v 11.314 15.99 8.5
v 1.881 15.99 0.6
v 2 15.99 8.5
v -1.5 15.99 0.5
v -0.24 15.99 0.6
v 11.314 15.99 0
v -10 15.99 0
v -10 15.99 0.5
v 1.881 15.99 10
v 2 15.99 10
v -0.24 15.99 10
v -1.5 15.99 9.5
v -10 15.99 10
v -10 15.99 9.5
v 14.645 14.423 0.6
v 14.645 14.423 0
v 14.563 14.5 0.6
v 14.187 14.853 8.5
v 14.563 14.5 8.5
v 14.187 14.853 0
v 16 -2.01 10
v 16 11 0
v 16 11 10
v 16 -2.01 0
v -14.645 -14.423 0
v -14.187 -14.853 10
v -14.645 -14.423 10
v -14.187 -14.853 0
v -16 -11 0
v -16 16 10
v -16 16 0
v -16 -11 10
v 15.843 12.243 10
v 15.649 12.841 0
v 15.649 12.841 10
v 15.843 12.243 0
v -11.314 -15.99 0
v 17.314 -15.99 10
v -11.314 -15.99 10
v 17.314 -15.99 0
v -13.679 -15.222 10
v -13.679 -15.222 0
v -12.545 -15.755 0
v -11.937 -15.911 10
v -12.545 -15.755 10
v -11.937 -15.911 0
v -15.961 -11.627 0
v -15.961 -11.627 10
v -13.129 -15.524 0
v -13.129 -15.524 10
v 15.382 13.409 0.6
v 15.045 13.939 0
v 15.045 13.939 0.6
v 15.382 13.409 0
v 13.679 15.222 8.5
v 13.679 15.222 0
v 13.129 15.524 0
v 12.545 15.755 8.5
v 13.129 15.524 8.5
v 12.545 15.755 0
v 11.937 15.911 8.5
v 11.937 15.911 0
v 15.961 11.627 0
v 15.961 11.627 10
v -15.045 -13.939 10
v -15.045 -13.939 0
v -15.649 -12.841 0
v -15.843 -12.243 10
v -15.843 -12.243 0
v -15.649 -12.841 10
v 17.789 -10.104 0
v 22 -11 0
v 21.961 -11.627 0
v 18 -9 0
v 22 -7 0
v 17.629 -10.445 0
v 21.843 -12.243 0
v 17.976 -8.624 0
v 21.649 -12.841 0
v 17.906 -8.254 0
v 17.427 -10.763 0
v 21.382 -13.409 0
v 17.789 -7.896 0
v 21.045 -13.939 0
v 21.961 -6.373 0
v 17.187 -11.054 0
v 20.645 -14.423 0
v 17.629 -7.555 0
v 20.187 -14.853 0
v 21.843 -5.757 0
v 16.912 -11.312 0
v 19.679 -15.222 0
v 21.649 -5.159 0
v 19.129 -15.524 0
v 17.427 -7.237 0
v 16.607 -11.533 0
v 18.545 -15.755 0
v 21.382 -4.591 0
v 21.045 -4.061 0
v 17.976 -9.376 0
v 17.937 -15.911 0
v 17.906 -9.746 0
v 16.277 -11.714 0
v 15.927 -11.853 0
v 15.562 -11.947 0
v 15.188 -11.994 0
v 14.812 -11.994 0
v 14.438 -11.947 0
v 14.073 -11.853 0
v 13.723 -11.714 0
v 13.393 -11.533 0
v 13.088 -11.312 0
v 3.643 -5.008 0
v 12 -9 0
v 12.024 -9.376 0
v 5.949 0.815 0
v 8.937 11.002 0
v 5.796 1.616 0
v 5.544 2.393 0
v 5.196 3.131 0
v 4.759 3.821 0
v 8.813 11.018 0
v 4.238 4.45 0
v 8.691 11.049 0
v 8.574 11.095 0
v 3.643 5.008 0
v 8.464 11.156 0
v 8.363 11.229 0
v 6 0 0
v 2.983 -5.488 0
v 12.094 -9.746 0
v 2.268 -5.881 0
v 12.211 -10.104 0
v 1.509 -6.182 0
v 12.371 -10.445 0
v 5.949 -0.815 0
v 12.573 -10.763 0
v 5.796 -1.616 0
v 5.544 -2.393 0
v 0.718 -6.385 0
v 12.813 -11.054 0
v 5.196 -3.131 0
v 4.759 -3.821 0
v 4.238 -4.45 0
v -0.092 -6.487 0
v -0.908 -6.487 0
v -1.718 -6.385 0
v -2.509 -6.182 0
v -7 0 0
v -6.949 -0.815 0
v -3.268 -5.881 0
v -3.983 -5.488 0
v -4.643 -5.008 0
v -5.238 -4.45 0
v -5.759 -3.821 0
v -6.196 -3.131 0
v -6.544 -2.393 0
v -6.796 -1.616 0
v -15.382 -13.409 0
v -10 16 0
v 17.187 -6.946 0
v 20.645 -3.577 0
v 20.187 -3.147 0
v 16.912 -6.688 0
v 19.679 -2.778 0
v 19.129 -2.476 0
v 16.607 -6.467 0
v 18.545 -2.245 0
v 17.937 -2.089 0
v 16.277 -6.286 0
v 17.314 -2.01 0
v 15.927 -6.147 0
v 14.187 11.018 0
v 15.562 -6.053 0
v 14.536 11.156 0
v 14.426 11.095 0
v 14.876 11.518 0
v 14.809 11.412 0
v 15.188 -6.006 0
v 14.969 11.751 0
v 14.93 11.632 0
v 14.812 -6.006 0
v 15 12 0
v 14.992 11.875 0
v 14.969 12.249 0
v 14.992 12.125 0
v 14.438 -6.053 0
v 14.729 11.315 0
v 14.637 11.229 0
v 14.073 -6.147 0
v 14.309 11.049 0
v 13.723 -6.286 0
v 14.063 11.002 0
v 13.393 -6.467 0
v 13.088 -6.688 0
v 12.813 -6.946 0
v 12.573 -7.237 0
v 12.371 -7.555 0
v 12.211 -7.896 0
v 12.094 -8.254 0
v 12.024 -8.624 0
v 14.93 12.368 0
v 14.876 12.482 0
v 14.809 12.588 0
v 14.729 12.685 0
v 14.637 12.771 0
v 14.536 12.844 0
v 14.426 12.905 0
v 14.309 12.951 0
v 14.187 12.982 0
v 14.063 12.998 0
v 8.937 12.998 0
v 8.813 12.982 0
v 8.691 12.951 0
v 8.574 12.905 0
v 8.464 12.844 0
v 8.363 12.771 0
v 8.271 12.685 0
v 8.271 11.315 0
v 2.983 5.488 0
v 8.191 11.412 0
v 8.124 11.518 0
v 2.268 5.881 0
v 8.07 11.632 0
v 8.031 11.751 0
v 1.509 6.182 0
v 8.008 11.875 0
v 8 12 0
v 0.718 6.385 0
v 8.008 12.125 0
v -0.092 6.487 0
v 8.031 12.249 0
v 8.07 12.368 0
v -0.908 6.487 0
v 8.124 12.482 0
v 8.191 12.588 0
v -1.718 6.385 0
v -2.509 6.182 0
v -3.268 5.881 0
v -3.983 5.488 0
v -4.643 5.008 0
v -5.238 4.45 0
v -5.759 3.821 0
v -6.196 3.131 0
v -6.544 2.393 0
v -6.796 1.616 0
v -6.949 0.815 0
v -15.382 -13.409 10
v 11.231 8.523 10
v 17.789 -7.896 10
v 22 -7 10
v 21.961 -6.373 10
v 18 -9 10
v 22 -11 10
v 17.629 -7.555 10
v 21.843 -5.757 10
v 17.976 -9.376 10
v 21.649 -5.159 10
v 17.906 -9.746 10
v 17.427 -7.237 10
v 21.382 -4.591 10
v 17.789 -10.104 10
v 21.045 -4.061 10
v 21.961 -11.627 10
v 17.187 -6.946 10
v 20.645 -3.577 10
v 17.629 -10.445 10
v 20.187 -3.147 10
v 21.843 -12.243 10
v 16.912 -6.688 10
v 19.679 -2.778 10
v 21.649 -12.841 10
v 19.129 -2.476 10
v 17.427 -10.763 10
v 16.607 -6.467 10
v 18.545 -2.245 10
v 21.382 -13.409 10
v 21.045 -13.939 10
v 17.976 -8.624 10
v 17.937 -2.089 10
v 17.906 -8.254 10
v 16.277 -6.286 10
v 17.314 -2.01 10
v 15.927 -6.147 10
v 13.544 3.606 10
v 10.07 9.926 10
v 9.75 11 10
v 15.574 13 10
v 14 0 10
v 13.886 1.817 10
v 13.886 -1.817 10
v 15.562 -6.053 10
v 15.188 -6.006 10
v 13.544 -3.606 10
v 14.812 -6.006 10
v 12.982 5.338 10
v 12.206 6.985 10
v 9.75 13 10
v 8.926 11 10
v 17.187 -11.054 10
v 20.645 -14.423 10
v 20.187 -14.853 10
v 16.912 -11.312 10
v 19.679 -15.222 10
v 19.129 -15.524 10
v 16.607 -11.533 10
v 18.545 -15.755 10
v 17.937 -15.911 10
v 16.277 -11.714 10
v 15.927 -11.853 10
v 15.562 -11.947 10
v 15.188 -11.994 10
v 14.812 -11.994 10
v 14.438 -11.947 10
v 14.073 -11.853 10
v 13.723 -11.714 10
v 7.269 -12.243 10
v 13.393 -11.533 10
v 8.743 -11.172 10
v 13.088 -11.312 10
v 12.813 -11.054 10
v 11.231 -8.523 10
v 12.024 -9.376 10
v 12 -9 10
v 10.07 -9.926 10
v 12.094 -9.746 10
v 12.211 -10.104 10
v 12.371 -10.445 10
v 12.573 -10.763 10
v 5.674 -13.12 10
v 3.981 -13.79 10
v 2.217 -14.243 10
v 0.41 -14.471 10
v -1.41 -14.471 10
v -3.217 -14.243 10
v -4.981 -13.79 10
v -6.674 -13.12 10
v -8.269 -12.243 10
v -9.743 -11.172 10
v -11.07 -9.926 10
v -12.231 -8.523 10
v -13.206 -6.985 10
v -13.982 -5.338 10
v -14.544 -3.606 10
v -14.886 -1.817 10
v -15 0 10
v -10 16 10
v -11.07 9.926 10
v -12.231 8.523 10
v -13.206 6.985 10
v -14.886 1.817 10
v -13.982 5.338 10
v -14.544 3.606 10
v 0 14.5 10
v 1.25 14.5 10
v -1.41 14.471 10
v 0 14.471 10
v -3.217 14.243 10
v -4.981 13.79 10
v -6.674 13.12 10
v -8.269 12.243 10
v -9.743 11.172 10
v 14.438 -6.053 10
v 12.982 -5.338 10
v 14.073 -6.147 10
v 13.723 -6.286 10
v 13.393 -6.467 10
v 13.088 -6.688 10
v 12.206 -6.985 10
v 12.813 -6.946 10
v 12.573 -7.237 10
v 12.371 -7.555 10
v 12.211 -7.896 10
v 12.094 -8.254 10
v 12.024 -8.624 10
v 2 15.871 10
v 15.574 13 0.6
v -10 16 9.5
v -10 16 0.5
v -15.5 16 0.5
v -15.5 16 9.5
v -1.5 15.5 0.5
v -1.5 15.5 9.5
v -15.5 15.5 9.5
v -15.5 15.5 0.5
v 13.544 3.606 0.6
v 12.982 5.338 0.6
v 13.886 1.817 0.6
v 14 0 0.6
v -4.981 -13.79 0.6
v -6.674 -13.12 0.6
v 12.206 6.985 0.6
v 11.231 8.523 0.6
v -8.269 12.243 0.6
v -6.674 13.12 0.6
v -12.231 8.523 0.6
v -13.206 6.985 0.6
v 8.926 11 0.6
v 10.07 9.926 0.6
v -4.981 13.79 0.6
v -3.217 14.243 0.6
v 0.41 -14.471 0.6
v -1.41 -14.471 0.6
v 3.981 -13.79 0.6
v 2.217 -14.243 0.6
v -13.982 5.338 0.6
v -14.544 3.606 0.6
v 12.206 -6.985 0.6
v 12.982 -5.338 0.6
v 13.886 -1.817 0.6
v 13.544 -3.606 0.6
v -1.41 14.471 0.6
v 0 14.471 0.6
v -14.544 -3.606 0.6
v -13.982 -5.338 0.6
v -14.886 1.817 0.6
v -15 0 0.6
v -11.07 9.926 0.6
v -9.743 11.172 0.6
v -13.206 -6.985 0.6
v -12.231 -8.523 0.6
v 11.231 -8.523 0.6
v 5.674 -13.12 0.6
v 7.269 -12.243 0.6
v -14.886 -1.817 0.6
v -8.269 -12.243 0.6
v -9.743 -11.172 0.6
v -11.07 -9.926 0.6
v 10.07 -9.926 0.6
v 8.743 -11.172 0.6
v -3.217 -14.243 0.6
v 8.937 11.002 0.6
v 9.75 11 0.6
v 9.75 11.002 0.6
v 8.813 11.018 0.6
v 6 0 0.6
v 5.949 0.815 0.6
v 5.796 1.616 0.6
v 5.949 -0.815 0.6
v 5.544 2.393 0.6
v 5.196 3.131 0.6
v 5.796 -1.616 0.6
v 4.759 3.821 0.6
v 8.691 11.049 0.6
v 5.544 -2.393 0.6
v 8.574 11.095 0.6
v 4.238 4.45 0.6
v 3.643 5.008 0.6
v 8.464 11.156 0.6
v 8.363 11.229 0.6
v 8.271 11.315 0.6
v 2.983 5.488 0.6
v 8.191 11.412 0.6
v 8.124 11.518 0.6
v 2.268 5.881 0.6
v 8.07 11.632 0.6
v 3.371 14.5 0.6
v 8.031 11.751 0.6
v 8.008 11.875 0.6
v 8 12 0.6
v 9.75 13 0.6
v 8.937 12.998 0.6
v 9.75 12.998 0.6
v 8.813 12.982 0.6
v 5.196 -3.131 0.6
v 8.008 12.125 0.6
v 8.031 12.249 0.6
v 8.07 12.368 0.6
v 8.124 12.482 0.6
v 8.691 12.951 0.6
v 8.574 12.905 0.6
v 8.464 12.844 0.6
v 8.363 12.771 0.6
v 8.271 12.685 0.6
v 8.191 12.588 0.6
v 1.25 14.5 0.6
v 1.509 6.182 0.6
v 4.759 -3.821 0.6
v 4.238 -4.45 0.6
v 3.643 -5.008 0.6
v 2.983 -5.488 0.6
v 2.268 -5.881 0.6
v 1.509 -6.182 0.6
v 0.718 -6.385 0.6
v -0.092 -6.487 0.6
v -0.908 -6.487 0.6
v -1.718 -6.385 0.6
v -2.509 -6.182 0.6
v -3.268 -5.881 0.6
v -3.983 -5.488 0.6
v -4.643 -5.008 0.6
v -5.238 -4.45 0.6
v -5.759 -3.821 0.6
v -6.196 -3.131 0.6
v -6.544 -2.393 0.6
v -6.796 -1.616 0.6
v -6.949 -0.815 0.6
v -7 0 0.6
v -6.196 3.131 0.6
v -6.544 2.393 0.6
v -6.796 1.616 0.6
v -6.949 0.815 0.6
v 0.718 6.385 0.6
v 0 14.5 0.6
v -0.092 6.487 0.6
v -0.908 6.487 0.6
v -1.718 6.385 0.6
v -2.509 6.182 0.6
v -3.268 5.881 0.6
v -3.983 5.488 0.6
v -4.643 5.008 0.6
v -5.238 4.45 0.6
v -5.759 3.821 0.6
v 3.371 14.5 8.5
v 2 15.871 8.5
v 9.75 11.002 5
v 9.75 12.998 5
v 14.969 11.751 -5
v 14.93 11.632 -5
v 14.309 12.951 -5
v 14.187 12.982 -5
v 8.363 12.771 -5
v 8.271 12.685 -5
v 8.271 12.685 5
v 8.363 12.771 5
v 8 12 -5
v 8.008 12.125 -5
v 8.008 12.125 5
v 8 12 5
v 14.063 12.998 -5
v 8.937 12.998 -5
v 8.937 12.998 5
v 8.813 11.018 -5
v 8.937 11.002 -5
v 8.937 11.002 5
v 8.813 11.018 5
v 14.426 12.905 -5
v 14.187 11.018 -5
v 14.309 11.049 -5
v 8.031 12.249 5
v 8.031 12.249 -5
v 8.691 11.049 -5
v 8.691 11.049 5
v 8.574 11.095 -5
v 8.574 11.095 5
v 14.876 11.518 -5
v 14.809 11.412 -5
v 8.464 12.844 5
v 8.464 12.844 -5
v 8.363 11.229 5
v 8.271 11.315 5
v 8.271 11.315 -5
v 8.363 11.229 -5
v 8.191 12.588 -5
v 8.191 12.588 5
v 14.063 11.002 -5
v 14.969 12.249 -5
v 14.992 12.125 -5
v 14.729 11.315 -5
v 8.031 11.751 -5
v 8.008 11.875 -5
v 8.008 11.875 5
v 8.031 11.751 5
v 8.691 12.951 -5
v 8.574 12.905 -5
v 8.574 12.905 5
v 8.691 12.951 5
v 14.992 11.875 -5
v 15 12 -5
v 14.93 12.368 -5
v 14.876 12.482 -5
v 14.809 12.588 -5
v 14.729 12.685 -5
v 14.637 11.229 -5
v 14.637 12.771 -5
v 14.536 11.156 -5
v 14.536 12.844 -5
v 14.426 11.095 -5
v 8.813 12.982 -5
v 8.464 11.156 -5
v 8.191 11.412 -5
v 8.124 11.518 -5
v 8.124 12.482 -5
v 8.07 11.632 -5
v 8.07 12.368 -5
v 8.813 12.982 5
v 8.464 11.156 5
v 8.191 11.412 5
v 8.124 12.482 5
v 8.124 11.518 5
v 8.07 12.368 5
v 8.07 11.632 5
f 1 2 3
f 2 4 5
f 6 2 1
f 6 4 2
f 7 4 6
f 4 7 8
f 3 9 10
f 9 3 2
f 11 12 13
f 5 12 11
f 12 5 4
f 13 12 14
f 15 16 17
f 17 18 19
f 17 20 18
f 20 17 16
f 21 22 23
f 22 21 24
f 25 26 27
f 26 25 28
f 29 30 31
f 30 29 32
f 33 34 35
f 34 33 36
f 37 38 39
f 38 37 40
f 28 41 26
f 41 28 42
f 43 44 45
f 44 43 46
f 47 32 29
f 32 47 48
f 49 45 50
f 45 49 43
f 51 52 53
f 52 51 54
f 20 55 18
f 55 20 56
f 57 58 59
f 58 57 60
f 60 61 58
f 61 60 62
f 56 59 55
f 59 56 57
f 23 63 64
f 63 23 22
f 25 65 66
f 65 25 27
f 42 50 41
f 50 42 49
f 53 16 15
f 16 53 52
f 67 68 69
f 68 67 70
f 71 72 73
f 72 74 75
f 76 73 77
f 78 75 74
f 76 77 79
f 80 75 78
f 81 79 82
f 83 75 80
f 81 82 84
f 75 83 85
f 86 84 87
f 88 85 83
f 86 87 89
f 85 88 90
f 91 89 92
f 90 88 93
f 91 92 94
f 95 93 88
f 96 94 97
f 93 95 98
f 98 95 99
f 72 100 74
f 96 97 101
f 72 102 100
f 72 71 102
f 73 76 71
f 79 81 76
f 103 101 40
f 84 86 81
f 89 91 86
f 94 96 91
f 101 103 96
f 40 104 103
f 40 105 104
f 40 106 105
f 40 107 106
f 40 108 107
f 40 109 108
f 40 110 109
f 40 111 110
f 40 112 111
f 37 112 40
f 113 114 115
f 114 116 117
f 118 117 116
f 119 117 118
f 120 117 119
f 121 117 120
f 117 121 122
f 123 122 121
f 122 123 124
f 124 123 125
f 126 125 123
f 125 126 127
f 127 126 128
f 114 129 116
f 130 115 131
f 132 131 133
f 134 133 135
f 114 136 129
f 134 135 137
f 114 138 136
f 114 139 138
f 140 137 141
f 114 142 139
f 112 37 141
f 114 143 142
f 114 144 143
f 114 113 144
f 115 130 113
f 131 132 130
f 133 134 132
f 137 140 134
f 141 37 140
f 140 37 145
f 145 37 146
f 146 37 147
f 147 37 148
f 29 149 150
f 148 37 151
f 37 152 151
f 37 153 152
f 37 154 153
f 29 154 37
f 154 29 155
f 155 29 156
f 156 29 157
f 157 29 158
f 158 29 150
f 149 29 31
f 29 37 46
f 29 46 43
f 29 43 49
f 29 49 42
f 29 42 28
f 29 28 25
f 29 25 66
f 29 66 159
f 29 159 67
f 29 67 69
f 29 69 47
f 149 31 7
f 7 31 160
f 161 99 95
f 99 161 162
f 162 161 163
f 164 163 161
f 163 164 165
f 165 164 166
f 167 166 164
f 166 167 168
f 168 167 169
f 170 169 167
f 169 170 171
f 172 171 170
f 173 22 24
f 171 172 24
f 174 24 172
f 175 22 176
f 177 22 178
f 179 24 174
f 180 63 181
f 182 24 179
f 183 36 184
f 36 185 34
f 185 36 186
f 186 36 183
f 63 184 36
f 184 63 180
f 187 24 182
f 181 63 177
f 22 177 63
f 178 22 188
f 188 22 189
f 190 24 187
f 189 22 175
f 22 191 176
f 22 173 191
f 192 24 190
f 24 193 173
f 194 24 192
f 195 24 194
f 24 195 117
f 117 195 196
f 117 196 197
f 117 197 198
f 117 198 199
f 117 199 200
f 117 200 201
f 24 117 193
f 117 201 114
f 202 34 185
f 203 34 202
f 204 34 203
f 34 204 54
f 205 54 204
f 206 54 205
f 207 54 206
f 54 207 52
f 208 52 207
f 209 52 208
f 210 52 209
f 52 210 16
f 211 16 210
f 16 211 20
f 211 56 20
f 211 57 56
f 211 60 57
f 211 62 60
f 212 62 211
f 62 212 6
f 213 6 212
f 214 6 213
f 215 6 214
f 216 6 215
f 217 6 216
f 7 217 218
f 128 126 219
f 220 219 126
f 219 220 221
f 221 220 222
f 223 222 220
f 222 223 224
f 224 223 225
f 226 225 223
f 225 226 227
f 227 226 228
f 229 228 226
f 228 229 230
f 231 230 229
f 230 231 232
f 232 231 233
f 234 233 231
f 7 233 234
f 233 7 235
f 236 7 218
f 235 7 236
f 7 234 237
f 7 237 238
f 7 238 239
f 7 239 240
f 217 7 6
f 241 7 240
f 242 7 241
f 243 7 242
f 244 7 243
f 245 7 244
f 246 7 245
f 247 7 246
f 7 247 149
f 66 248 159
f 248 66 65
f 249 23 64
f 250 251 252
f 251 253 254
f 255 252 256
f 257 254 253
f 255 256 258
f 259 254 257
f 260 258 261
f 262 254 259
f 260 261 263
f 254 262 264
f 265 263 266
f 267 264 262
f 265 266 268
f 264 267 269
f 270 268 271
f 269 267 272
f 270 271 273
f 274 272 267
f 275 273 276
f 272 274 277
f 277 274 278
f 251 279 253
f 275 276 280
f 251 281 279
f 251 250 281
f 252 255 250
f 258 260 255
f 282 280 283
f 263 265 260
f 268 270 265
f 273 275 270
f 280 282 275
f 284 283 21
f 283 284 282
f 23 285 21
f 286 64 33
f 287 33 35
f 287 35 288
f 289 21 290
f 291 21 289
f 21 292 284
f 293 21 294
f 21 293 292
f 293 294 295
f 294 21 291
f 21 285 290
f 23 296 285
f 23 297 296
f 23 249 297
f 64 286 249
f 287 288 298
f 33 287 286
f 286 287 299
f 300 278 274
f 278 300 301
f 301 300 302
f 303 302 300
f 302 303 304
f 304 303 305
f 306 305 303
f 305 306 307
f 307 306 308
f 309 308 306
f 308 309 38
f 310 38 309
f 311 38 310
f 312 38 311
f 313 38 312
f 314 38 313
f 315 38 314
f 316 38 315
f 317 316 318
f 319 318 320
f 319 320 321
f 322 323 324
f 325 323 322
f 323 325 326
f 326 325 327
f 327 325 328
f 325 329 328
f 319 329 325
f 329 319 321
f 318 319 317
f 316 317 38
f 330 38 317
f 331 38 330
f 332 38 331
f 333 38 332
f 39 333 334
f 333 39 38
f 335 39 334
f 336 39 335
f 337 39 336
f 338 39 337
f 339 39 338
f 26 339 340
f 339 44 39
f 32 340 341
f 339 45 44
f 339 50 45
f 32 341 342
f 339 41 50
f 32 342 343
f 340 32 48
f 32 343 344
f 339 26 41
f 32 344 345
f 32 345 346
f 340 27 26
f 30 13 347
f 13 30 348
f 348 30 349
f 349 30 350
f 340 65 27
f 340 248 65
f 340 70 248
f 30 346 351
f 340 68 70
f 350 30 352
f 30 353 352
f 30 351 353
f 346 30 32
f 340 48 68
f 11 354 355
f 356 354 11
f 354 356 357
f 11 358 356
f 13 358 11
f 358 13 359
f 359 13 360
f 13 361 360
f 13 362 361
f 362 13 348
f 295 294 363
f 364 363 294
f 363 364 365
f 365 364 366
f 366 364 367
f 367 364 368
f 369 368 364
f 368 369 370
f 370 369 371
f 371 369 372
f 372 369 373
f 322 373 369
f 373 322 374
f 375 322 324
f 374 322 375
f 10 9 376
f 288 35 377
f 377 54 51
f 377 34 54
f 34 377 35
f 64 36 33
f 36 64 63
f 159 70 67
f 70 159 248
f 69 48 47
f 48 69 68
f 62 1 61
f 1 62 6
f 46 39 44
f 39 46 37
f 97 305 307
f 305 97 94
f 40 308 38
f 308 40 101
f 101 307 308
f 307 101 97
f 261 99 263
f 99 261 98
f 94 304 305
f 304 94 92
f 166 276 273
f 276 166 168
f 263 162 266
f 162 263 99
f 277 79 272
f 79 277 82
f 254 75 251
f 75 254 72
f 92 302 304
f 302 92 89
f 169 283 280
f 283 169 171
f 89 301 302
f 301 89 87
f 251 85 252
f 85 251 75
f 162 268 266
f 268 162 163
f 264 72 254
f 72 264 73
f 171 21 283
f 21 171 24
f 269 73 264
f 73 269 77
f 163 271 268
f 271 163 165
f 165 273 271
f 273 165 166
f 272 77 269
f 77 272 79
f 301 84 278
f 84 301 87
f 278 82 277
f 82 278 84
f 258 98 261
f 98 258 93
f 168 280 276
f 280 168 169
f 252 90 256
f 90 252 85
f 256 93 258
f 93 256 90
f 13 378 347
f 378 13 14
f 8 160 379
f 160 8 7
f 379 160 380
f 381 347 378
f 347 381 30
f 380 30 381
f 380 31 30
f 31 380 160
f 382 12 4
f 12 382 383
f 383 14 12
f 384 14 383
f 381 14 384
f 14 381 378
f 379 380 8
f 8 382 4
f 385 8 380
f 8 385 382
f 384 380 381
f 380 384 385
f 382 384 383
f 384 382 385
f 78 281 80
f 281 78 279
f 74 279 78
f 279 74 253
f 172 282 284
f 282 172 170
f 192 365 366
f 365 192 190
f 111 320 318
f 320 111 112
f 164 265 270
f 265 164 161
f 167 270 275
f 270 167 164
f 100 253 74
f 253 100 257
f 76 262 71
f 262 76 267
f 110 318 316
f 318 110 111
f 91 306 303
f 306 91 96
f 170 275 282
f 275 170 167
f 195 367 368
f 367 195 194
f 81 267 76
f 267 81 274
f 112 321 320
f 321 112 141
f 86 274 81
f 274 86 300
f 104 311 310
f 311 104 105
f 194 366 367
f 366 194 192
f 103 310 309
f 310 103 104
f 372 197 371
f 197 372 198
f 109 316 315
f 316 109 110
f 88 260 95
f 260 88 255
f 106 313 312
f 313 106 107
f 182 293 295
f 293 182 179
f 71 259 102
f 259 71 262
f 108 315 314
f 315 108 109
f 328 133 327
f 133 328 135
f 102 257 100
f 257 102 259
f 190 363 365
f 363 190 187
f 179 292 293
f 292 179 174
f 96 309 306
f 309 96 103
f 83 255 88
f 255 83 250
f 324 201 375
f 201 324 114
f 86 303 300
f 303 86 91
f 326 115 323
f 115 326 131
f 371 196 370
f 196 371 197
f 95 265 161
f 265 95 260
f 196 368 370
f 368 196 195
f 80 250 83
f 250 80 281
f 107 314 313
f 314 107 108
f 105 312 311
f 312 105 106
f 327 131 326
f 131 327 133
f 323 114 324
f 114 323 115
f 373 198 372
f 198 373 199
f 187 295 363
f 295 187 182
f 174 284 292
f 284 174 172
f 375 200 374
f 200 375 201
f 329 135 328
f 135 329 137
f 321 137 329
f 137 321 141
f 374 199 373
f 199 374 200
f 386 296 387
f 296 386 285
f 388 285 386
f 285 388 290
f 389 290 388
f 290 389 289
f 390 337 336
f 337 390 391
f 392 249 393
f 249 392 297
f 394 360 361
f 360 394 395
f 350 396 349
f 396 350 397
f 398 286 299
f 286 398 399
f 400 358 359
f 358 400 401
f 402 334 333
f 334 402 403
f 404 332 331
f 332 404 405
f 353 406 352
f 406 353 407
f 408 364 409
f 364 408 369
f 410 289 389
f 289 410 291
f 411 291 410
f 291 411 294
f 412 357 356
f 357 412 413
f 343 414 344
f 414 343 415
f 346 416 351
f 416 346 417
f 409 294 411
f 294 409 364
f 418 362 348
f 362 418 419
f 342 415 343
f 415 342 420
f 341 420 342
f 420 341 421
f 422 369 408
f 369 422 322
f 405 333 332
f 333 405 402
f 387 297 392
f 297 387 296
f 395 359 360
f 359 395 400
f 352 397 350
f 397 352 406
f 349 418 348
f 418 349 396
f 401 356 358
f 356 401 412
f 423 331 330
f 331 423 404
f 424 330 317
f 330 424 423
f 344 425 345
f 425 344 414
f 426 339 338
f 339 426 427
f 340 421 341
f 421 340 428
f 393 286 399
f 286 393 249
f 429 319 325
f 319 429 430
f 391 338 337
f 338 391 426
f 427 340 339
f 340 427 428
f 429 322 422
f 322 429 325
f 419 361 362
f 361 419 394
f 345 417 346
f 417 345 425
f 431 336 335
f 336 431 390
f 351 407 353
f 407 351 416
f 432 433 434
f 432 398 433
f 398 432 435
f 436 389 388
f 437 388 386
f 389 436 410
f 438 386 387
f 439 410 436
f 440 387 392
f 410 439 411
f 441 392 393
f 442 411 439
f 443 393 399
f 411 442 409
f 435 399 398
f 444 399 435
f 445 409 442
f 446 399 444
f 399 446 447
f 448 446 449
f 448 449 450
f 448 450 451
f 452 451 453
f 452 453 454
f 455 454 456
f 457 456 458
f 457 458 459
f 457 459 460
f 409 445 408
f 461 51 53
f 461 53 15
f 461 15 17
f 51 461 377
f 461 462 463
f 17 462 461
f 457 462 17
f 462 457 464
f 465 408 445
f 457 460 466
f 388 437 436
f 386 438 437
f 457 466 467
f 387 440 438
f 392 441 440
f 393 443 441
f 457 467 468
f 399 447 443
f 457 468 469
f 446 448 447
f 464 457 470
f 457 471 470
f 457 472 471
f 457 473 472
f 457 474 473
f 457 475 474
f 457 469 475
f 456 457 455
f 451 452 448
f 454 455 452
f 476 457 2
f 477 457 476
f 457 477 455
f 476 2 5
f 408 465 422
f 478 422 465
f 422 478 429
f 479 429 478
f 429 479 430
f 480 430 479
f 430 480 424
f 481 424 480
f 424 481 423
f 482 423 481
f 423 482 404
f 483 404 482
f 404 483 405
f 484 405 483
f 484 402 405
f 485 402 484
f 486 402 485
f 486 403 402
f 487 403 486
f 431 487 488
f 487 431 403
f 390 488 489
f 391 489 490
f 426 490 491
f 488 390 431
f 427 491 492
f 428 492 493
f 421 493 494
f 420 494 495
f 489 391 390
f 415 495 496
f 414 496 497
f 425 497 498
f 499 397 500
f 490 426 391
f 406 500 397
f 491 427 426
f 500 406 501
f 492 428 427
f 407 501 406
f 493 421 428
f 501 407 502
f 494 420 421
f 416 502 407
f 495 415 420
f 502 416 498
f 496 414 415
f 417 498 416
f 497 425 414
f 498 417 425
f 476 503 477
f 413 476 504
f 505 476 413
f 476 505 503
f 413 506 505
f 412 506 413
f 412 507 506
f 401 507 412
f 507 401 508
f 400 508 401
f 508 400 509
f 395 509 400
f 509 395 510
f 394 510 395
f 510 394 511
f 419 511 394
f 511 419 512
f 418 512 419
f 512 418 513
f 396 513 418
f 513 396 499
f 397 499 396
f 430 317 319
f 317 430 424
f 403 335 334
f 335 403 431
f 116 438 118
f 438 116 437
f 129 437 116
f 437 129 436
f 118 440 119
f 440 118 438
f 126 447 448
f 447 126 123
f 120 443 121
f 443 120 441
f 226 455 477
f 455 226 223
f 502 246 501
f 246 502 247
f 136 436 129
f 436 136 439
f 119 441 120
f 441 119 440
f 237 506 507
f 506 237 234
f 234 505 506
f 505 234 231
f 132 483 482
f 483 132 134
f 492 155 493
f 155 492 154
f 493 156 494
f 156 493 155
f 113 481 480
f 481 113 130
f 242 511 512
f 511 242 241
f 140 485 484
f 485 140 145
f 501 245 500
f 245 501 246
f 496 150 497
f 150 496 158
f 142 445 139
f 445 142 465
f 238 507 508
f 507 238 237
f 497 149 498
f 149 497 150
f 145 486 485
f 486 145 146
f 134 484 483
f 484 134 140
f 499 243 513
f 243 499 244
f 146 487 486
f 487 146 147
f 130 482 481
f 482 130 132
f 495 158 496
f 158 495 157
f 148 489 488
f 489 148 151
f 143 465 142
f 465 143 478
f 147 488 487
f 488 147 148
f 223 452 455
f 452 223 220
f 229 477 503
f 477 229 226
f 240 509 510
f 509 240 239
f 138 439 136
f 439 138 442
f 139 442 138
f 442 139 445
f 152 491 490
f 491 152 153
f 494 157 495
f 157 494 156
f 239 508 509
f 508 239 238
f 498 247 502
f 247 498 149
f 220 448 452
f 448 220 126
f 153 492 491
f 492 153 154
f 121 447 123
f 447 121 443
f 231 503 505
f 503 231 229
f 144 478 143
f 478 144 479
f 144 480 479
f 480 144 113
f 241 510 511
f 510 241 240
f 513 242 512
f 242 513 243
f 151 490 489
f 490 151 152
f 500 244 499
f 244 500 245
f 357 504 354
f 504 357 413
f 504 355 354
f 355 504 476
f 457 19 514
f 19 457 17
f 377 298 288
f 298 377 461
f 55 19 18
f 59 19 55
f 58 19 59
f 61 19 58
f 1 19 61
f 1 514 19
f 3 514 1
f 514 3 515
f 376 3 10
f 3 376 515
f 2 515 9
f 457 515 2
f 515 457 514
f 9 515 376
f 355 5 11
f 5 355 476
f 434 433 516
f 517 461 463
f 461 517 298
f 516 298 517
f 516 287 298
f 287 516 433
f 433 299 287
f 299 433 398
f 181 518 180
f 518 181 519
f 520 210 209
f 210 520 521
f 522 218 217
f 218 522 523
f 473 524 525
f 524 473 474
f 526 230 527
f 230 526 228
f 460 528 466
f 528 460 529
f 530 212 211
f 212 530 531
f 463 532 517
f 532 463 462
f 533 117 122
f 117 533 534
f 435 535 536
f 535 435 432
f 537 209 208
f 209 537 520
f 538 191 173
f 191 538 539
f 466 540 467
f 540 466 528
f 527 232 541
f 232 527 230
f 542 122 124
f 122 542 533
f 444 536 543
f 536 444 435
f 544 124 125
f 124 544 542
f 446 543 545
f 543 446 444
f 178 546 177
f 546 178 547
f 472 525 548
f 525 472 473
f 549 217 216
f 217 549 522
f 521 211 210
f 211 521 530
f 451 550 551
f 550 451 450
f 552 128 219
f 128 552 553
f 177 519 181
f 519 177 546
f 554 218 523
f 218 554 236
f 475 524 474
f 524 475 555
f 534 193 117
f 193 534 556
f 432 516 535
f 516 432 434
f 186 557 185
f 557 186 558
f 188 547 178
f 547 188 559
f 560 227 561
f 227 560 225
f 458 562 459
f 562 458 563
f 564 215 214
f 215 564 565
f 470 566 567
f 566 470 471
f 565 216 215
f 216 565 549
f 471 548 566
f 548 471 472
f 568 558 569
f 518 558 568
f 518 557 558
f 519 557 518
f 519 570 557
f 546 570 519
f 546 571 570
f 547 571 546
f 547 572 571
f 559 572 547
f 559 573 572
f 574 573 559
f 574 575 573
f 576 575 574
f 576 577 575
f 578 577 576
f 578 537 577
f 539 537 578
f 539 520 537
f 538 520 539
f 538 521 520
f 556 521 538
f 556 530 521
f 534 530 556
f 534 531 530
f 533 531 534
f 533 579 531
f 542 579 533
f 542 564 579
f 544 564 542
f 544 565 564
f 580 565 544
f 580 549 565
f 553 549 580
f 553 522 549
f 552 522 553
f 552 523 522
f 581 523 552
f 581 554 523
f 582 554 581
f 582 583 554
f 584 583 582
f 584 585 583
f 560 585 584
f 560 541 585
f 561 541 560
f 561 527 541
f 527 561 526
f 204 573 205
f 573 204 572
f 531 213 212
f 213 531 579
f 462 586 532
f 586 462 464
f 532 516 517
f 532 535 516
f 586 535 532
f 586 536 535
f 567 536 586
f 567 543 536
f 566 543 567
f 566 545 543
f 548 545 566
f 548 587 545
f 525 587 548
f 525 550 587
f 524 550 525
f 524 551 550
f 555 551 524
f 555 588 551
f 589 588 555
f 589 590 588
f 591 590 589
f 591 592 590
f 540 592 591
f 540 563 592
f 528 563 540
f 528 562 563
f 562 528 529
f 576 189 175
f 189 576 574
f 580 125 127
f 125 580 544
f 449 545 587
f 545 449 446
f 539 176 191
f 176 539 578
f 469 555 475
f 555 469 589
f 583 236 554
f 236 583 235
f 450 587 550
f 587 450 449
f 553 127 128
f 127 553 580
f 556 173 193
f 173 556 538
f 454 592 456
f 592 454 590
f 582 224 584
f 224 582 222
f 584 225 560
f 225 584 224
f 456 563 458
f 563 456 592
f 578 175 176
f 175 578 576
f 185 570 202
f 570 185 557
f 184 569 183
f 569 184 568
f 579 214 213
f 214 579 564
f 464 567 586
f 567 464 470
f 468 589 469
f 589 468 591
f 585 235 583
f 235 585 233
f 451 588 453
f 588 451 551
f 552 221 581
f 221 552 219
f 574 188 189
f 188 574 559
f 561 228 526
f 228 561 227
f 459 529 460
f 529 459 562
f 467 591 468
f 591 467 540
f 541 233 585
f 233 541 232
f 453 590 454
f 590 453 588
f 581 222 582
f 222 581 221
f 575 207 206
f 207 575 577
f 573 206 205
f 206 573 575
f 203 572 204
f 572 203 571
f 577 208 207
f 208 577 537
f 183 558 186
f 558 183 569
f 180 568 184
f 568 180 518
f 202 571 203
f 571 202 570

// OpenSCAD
$fn = 50;


union() {
	difference() {
		union() {
			hull() {
				translate(v = [-11.0000000000, 11.0000000000, 0]) {
					cylinder(h = 10, r = 5);
				}
				translate(v = [11.0000000000, 11.0000000000, 0]) {
					cylinder(h = 10, r = 5);
				}
				translate(v = [-11.0000000000, -11.0000000000, 0]) {
					cylinder(h = 10, r = 5);
				}
				translate(v = [11.0000000000, -11.0000000000, 0]) {
					cylinder(h = 10, r = 5);
				}
			}
			translate(v = [7.5000000000, -9.0000000000, 0]) {
				hull() {
					translate(v = [-9.5000000000, 2.0000000000, 0]) {
						cylinder(h = 10, r = 5);
					}
					translate(v = [9.5000000000, 2.0000000000, 0]) {
						cylinder(h = 10, r = 5);
					}
					translate(v = [-9.5000000000, -2.0000000000, 0]) {
						cylinder(h = 10, r = 5);
					}
					translate(v = [9.5000000000, -2.0000000000, 0]) {
						cylinder(h = 10, r = 5);
					}
				}
			}
			translate(v = [-16.0000000000, 10.0000000000, 0]) {
				cube(size = [6, 6, 10]);
			}
		}
		union() {
			translate(v = [-15.5000000000, 15.5000000000, 0.5000000000]) {
				cube(size = [14, 0.5000000000, 9.0000000000]);
			}
			translate(v = [15.0000000000, -9.0000000000, -100.0000000000]) {
				cylinder(h = 200, r = 3.0000000000);
			}
			translate(v = [-0.5000000000, 0.0000000000, 0.6000000000]) {
				cylinder(h = 12.4000000000, r = 14.5000000000);
			}
			translate(v = [-0.5000000000, 0.0000000000, -5.0000000000]) {
				cylinder(h = 10, r = 6.5000000000);
			}
			translate(v = [0.0000000000, 13.0000000000, 0.6000000000]) {
				cube(size = [16.0000000000, 1.5000000000, 12.4000000000]);
			}
			translate(v = [2.0000000000, 13.0000000000, 8.5000000000]) {
				cube(size = [14.0000000000, 4.5000000000, 1.5000000000]);
			}
			translate(v = [-3.0000000000, 18.7500000000, 0.6000000000]) {
				rotate(a = [0, 0, -45]) {
					cube(size = [10, 1.5000000000, 12.4000000000]);
				}
			}
			translate(v = [2.2500000000, 11.0000000000, 0.6000000000]) {
				cube(size = [7.5000000000, 2, 9.4000000000]);
			}
		}
	}
	union() {
		translate(v = [11.5000000000, 12, -5.0000000000]) {
			rotate(a = [0, 0, 0]) {
				difference() {
					union() {
						hull() {
							translate(v = [2.5000000000, 0, 0]) {
								cylinder(h = 10, r = 1.0000000000, r1 = 1.0000000000, r2 = 1.0000000000);
							}
							translate(v = [-2.5000000000, 0, 0]) {
								cylinder(h = 10, r = 1.0000000000, r1 = 1.0000000000, r2 = 1.0000000000);
							}
						}
					}
					union();
				}
			}
		}
	}
}
